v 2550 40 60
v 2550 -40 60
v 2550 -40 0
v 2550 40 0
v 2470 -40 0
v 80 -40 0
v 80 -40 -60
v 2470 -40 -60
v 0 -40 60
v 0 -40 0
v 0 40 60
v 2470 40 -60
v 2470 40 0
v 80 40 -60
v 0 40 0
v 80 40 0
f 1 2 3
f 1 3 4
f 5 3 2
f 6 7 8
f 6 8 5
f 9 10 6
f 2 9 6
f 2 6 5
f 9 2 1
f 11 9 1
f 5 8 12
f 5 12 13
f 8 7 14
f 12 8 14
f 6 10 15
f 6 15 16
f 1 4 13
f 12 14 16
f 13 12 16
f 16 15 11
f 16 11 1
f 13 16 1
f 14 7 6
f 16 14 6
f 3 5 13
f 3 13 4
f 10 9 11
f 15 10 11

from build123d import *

# Parameters (mm, degrees)
F0_W     = 80
F0_H     = 120
F1_DEPTH = 2550
F2_W     = 80
F2_H     = 60
F3_DEPTH = 80


with BuildPart() as f1:
    # F0 (on Right) → F1 (new body)
    with BuildSketch(Plane.YZ):
        Rectangle(F0_W, F0_H)
    extrude(amount=F1_DEPTH)

    # F2 (on face) → F3 (cut, through all)
    with BuildSketch(Plane.XZ.offset(40)):
        with Locations((2510, -30)):
            Rectangle(F2_W, F2_H)
        with Locations((40, -30)):
            Rectangle(F2_W, F2_H)
    extrude(amount=-F3_DEPTH, mode=Mode.SUBTRACT)


solid = f1.part
